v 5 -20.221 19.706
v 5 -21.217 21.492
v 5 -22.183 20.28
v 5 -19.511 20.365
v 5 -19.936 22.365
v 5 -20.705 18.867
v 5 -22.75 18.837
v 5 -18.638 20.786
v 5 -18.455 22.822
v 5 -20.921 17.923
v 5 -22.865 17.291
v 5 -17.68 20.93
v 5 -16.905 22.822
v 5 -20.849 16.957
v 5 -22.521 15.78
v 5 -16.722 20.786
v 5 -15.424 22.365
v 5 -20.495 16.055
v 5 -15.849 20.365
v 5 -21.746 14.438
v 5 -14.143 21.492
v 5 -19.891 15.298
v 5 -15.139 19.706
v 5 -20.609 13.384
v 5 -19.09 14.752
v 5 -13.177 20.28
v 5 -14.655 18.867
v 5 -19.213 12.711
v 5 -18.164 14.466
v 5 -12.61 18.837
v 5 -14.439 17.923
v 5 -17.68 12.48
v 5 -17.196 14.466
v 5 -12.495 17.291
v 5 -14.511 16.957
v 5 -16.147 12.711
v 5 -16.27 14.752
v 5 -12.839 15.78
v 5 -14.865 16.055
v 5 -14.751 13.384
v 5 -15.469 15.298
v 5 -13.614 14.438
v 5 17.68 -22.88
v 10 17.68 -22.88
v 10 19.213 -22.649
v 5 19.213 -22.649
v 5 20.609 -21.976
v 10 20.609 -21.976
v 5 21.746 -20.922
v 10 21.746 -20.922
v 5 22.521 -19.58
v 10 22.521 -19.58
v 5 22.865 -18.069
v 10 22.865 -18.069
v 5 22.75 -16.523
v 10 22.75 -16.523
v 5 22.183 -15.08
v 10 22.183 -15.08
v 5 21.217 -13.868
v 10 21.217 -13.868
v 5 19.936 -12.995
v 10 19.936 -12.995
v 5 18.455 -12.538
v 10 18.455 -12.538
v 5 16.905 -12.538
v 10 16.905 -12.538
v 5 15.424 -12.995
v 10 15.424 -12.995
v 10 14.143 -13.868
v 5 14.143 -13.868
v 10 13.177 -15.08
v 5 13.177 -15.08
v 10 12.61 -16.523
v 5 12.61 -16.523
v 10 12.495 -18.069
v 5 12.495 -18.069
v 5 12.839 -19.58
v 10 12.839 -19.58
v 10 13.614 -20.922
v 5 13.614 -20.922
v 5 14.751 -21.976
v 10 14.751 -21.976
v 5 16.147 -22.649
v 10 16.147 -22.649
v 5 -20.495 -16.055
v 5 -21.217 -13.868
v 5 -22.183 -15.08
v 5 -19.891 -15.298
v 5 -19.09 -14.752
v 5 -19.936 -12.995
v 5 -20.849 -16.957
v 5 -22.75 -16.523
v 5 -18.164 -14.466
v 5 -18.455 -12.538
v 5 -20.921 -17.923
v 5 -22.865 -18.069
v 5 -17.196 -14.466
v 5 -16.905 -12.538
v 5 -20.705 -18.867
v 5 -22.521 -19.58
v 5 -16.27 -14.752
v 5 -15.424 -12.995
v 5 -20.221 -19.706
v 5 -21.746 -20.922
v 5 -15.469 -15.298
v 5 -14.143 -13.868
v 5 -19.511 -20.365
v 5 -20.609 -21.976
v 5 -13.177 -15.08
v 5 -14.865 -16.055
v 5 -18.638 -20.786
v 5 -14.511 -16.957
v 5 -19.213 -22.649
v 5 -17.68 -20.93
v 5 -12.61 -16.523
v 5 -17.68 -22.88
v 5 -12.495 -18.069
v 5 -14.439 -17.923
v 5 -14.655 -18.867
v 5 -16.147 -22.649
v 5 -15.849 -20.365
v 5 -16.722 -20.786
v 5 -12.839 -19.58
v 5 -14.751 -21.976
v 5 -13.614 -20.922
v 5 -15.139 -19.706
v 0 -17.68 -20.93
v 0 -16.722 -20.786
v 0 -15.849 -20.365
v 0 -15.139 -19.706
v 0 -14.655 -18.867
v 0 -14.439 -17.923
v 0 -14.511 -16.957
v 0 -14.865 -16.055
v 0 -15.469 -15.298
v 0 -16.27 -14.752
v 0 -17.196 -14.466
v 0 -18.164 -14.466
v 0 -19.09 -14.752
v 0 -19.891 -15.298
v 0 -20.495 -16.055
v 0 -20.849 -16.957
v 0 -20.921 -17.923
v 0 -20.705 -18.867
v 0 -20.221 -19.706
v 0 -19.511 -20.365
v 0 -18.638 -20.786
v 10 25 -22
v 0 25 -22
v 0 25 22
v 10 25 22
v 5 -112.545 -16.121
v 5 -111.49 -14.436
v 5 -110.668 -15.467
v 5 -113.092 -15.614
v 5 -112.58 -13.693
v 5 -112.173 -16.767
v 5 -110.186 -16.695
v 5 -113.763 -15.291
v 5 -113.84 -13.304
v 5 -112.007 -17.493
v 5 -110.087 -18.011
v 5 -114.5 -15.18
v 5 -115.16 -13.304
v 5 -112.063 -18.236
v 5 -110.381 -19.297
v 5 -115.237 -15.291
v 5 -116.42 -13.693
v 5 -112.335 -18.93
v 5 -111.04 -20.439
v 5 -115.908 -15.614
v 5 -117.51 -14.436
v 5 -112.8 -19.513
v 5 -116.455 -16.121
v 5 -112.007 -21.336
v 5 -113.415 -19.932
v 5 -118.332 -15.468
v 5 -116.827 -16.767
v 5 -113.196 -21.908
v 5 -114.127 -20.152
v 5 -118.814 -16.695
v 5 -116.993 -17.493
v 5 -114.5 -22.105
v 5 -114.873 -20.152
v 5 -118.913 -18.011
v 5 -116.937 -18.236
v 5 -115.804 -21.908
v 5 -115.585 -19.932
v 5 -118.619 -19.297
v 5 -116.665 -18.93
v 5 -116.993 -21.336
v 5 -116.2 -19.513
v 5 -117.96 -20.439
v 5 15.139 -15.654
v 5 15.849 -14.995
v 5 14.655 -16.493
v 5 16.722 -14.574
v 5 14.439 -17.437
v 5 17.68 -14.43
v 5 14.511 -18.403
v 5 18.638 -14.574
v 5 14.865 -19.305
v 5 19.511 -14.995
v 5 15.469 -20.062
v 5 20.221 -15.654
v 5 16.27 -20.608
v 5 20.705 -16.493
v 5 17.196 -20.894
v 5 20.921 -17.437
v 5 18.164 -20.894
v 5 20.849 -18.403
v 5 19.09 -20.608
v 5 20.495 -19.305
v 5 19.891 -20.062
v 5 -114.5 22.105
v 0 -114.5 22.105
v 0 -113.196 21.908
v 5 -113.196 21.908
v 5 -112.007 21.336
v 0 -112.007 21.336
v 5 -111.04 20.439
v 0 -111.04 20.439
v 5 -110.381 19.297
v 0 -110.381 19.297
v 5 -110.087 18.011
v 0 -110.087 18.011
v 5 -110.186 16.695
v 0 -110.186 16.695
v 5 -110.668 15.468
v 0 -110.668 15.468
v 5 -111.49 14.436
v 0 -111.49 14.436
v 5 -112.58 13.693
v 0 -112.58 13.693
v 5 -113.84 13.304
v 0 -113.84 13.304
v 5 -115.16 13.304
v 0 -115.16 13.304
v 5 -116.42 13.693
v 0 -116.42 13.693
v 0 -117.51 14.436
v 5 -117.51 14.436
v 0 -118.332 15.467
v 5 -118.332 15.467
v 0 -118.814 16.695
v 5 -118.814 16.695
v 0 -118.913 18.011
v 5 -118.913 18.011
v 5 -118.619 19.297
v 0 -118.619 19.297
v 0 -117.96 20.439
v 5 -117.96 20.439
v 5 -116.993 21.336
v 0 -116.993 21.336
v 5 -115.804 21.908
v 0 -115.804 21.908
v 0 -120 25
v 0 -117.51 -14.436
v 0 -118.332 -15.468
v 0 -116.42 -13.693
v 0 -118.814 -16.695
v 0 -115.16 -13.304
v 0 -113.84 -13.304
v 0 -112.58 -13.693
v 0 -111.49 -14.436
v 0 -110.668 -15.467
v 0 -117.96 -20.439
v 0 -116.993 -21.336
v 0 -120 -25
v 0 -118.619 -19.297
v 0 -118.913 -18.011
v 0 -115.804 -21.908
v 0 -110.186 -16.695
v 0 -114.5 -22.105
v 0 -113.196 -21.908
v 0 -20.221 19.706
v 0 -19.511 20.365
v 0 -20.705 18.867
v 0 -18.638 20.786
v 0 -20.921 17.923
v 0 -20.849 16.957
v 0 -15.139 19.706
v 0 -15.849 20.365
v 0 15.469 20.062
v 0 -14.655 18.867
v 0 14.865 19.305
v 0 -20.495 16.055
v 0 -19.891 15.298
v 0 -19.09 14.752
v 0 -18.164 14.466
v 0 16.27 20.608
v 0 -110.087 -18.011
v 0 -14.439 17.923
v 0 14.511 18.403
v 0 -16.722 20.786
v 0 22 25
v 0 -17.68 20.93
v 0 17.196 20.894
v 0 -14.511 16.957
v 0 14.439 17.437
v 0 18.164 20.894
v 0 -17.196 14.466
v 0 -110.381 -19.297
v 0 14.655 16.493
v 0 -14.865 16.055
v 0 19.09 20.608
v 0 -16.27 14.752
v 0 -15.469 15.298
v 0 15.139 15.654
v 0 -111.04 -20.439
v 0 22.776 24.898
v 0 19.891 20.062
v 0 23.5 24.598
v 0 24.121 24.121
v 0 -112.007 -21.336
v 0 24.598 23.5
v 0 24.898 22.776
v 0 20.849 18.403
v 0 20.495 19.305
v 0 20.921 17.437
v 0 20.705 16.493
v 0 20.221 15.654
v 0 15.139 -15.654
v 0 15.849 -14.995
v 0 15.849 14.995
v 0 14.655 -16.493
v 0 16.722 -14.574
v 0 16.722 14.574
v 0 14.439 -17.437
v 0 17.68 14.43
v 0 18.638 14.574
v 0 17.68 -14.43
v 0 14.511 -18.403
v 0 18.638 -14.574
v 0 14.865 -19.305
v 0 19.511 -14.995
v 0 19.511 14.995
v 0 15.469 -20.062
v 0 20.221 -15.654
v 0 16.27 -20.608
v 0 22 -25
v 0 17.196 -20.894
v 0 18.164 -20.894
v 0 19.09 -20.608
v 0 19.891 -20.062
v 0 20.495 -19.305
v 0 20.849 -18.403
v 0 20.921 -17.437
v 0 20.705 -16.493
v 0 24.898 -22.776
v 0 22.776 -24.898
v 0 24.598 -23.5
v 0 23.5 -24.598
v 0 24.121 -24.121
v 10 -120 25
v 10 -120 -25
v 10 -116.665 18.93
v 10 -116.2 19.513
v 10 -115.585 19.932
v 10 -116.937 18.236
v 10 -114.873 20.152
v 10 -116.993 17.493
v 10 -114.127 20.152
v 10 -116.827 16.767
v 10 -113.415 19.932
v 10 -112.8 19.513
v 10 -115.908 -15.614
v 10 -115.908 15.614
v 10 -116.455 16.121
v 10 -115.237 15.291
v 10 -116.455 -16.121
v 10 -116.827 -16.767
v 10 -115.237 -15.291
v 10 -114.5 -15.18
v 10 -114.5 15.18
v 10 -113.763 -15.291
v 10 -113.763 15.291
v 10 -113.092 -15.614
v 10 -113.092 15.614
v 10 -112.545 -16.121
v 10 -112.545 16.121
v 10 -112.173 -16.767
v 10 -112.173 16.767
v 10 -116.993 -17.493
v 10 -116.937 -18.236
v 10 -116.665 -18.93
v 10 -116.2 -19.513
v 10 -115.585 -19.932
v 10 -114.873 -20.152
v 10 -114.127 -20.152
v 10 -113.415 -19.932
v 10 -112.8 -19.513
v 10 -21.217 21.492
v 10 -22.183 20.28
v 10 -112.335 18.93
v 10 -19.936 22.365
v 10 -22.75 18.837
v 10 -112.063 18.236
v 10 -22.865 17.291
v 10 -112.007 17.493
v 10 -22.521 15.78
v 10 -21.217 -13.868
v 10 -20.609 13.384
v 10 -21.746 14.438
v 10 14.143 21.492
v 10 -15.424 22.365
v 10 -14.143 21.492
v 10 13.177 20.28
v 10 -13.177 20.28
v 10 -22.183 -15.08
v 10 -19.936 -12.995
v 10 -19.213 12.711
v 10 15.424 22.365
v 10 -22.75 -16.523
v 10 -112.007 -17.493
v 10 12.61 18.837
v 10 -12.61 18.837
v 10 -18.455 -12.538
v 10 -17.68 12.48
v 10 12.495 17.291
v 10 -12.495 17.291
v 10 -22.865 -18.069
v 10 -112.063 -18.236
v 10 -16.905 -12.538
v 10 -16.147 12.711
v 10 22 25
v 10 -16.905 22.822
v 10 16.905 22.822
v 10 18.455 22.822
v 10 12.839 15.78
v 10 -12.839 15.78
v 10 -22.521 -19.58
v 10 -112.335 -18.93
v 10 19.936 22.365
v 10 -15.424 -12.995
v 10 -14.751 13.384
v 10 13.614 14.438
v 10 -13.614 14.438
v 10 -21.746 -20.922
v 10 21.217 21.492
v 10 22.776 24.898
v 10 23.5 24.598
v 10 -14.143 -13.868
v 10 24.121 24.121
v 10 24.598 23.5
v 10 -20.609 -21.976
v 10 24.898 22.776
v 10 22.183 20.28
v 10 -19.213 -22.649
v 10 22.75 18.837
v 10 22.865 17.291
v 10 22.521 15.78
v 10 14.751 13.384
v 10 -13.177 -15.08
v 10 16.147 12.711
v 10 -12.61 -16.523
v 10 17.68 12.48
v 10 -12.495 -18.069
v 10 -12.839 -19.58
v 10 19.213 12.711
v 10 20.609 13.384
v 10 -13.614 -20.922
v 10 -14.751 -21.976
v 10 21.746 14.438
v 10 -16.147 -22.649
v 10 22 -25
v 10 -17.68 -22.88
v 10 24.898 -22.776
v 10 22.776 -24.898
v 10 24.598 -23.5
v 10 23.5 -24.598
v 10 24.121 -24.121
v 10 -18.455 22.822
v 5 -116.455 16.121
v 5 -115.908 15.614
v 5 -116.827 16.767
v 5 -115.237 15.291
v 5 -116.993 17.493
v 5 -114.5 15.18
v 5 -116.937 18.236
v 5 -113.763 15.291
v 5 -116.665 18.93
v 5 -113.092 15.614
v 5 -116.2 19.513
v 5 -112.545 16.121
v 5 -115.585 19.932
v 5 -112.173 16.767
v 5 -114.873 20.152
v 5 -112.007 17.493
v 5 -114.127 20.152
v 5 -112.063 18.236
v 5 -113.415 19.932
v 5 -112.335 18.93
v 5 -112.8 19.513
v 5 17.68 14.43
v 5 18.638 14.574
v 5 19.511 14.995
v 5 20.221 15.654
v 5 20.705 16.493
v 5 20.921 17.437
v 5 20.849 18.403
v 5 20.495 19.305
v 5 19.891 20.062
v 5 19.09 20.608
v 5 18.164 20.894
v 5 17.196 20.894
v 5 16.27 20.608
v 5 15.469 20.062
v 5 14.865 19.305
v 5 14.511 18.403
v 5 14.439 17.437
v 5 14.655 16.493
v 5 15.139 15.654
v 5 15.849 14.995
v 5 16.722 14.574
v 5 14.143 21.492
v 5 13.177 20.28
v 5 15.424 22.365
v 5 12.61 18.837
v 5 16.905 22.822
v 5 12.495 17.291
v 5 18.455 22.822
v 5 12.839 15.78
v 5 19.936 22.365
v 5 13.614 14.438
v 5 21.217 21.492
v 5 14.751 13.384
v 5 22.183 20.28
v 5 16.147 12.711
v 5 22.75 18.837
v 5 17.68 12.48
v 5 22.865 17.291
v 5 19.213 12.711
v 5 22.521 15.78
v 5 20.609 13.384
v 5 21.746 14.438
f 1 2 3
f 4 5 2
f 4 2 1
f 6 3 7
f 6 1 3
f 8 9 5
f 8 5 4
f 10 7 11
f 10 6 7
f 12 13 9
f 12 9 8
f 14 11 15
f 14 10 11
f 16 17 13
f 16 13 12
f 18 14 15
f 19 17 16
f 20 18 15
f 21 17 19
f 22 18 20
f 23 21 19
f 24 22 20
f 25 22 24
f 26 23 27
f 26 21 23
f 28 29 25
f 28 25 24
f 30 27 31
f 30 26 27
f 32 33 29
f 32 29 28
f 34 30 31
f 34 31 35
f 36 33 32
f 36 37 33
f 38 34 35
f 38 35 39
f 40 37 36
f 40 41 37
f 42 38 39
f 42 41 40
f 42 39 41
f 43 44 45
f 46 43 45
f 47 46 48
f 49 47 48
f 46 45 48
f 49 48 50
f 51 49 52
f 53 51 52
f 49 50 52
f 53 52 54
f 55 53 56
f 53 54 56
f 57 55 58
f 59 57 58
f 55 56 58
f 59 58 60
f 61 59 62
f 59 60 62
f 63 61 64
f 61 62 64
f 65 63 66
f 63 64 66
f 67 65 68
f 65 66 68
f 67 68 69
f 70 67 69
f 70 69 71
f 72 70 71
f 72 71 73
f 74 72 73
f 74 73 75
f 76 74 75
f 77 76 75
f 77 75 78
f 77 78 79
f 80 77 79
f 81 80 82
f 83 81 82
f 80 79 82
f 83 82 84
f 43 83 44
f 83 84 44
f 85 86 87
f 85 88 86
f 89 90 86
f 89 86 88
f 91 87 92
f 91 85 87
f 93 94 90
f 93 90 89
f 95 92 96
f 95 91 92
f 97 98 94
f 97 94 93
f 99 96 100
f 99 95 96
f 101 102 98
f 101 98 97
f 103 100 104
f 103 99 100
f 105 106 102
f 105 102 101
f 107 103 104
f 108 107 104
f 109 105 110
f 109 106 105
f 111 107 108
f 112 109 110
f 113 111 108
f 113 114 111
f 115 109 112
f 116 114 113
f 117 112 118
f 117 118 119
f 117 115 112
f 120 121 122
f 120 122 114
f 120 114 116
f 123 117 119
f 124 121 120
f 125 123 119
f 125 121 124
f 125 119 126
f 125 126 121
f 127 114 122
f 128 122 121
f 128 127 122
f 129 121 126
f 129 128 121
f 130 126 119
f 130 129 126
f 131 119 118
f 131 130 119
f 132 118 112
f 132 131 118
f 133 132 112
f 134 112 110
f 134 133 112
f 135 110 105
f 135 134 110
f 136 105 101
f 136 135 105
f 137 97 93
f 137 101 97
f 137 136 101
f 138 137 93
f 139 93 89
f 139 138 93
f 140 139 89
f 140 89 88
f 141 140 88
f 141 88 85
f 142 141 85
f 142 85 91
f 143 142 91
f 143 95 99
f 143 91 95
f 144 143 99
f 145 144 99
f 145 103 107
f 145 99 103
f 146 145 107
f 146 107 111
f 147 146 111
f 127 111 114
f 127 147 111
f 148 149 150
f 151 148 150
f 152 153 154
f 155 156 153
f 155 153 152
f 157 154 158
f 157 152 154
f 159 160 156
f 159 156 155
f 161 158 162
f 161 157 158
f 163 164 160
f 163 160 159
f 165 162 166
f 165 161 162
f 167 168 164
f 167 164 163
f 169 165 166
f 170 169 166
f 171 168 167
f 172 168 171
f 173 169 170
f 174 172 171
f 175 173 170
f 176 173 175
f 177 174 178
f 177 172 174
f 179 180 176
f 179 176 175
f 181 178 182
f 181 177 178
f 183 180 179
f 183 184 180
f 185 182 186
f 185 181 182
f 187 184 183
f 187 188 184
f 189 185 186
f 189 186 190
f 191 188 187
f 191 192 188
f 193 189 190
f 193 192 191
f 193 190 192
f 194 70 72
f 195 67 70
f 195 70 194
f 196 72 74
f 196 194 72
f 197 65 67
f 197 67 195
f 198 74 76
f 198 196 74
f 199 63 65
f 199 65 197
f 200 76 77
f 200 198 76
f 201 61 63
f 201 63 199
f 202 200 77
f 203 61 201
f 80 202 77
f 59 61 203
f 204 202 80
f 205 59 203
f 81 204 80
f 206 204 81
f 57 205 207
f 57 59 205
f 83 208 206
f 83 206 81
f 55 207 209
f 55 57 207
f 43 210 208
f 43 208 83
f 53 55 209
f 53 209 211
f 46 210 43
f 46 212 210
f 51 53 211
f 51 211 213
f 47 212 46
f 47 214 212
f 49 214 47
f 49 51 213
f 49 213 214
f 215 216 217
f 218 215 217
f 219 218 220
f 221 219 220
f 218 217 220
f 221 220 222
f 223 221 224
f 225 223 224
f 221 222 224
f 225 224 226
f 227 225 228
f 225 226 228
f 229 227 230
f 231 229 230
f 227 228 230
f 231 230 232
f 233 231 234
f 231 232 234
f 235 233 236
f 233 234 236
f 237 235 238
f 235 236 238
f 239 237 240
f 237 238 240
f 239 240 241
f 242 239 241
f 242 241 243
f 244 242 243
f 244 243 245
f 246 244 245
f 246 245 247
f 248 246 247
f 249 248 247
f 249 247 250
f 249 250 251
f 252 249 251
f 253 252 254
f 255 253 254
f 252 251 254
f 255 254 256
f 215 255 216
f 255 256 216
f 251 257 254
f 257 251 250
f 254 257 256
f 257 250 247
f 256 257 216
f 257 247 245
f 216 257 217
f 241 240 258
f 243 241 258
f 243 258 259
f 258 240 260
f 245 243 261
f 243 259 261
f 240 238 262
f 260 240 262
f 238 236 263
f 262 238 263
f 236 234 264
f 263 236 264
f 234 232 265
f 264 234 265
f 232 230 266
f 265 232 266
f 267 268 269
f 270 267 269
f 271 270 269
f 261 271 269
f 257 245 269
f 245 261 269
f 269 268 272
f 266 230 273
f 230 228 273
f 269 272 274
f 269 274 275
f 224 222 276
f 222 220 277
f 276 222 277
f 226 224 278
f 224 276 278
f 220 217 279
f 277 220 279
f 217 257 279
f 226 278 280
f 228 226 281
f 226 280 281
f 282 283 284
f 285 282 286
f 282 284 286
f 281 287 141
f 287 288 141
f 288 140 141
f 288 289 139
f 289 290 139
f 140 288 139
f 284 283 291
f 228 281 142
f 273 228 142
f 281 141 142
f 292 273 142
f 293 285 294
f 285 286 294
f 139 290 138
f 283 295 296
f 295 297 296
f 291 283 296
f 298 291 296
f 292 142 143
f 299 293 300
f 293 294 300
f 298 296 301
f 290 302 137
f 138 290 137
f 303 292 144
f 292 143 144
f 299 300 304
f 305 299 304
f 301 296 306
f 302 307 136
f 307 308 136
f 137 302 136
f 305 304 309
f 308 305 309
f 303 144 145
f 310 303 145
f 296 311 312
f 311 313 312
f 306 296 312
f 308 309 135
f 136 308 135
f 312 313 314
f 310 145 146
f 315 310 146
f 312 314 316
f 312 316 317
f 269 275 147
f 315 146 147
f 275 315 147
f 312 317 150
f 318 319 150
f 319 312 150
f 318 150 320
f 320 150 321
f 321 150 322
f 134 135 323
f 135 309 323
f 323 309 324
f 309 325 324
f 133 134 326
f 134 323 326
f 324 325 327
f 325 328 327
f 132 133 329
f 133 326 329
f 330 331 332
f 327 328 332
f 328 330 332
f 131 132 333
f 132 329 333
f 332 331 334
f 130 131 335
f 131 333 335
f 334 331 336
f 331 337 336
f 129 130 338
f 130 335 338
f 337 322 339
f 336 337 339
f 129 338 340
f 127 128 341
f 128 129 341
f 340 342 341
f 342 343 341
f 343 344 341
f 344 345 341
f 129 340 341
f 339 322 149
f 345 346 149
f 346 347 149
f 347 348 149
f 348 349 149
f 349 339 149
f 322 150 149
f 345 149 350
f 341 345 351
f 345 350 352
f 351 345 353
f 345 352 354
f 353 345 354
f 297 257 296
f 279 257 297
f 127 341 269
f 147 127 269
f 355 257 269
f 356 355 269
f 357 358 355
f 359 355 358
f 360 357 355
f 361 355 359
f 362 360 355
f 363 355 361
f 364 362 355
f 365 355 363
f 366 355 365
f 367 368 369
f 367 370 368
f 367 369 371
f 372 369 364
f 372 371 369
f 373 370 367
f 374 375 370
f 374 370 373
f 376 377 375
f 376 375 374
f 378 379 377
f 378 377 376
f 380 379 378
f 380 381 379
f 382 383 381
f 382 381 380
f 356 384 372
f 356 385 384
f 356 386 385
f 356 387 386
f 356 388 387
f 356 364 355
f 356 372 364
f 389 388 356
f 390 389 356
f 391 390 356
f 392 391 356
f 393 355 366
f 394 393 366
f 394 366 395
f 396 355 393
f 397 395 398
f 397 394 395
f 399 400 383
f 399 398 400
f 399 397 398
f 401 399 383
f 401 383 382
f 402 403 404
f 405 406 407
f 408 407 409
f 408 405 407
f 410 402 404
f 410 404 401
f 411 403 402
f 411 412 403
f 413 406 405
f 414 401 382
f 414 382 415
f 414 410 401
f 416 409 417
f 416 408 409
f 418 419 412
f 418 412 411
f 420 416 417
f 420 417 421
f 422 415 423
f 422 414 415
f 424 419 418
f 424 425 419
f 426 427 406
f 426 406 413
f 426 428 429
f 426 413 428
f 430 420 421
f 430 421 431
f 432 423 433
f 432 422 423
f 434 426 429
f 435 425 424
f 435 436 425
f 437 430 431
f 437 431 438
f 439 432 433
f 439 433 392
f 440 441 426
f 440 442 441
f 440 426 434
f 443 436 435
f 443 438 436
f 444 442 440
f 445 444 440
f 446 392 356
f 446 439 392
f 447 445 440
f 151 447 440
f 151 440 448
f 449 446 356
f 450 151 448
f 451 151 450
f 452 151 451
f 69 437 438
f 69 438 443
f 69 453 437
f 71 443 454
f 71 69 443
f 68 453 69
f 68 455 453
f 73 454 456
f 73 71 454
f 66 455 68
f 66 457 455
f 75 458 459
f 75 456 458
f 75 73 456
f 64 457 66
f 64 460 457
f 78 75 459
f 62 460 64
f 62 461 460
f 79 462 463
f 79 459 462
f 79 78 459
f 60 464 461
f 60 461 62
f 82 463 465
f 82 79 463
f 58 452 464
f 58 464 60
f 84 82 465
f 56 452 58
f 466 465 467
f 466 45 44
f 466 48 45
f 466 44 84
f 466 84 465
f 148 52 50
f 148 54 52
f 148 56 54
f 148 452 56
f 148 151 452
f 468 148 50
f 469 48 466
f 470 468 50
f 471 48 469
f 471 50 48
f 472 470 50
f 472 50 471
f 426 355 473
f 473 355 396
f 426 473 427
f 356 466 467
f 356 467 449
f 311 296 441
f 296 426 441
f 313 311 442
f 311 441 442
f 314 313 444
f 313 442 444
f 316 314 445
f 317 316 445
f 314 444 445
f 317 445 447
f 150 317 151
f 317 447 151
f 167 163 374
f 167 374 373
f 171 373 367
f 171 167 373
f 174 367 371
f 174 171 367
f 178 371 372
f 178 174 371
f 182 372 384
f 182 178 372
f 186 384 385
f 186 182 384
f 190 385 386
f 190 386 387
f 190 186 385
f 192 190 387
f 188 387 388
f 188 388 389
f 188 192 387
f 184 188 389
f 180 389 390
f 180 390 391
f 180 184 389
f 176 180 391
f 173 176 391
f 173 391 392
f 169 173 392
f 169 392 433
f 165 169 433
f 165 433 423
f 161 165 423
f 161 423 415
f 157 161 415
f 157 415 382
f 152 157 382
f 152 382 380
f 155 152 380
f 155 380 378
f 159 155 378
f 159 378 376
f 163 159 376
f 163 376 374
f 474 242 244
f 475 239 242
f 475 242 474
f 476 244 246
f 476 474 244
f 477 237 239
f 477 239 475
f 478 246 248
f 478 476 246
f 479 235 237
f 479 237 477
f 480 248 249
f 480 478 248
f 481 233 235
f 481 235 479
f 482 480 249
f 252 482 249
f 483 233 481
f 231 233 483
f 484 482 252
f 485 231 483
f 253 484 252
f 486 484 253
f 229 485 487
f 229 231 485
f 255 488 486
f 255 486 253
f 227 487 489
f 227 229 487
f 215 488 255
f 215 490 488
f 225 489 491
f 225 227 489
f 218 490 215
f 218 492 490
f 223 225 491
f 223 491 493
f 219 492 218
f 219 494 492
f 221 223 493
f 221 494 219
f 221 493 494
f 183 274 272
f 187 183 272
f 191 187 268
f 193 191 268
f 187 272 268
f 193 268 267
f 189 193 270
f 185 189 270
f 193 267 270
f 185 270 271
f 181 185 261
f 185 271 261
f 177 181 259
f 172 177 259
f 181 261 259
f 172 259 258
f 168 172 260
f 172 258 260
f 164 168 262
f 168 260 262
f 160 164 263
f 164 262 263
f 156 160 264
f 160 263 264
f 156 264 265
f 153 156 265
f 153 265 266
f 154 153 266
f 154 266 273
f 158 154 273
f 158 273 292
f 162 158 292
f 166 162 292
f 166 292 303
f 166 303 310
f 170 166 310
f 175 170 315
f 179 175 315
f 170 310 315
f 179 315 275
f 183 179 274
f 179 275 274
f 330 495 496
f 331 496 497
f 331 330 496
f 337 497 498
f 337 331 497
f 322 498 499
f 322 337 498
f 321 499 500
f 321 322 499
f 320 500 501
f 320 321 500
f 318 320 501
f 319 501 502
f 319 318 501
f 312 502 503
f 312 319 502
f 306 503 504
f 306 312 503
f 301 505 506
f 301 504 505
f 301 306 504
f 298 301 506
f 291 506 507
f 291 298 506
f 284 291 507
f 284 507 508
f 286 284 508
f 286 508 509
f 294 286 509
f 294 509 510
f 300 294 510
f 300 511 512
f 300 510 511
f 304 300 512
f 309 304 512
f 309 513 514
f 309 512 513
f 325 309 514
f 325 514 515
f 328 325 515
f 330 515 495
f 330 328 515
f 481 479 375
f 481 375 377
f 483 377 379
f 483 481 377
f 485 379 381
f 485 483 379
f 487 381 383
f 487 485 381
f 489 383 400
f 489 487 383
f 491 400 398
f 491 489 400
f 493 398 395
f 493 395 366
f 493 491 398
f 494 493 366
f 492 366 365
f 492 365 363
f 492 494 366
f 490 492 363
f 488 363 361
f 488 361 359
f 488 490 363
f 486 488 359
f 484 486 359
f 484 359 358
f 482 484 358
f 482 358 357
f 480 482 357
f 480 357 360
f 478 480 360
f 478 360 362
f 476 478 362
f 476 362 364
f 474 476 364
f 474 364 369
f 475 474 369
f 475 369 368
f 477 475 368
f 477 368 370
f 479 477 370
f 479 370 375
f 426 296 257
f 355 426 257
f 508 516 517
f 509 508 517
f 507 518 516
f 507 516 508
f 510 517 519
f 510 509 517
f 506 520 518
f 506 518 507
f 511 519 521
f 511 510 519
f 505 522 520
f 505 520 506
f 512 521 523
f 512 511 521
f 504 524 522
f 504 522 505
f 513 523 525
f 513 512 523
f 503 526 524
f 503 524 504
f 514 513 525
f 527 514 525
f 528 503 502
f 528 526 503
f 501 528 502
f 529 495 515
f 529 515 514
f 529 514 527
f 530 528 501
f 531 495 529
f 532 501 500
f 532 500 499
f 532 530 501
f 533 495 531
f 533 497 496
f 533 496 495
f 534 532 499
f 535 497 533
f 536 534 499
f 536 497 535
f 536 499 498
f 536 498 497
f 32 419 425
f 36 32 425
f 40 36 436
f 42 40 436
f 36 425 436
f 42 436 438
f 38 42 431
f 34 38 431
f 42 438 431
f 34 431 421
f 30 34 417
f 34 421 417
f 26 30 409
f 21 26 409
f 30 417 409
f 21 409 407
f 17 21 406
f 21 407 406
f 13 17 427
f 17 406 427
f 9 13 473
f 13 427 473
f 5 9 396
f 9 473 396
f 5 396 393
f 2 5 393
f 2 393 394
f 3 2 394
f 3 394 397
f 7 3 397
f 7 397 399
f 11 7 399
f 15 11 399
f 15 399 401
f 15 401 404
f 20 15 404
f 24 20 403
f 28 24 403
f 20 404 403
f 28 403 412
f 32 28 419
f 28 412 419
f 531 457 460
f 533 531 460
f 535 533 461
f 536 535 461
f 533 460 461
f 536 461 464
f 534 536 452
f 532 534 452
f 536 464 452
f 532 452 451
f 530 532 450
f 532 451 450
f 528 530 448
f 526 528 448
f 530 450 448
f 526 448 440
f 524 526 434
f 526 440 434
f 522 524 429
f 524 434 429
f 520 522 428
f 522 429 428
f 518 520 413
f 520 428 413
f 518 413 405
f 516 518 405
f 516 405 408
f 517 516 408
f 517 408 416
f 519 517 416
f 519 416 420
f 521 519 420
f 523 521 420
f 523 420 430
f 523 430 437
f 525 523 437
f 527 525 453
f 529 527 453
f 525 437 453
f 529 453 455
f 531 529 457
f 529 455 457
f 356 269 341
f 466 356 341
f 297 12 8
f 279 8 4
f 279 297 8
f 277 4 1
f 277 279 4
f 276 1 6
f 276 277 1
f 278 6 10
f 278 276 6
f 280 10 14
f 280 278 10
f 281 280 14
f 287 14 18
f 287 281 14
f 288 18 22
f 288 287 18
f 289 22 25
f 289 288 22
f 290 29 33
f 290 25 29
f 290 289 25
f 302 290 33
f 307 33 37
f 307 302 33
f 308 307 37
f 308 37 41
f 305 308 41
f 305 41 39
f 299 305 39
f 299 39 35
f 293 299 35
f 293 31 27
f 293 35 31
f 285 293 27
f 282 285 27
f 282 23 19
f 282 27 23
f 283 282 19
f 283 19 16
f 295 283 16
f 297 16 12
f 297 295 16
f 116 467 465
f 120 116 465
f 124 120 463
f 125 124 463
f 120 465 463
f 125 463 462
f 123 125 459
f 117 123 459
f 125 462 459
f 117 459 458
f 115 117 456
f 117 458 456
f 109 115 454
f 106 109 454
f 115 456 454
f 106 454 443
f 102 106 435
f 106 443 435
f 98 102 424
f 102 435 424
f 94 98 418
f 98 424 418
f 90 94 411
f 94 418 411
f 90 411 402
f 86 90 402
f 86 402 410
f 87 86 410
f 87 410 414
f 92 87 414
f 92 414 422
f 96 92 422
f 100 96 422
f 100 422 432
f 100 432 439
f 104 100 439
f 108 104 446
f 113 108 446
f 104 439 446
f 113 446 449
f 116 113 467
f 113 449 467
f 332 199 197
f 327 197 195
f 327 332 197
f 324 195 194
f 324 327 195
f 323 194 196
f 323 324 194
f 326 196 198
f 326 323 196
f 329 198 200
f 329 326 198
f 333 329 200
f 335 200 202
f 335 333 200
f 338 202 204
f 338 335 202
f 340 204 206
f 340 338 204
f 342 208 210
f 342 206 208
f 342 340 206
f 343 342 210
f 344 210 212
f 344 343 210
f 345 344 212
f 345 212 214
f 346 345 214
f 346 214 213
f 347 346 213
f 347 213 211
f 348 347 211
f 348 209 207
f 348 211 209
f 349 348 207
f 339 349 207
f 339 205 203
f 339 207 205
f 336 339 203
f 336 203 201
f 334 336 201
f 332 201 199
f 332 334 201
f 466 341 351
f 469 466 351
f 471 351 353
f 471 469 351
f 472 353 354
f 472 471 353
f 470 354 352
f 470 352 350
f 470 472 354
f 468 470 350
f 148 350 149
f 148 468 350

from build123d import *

# Parameters (mm, degrees)
CROQUIS1_R              = 3.25
CROQUIS1_R_2            = 2.5
SALIENTE_EXTRUIR1_DEPTH = 10
CROQUIS5_R              = 5.2
CORTAR_EXTRUIR2_DEPTH   = 5
FILLET1_R               = 3
SKETCH1_R               = 4.425
CUT_EXTRUDE1_DEPTH      = 5


with BuildPart() as part:
    # Croquis1 → Saliente-Extruir1 (new body)
    with BuildSketch(Plane(origin=(0, 0, 0), x_dir=(0, 0, -1), z_dir=(1, 0, 0))):
        Polygon((-25, -120), (25, -120), (25, 25), (0, 25), (-25, 25), (-25, 0), align=None)
        with Locations((-17.68, 17.68)):
            Circle(CROQUIS1_R, mode=Mode.SUBTRACT)
        with Locations(Location((17.68, 17.68, 0), (0, 0, 180))):
            Circle(CROQUIS1_R, mode=Mode.SUBTRACT)
        with Locations((17.68, -17.68)):
            Circle(CROQUIS1_R, mode=Mode.SUBTRACT)
        with Locations(Location((-17.68, -17.68, 0), (0, 0, 180))):
            Circle(CROQUIS1_R, mode=Mode.SUBTRACT)
        with Locations((-17.68, -114.5)):
            Circle(CROQUIS1_R_2, mode=Mode.SUBTRACT)
        with Locations(Location((17.68, -114.5, 0), (0, 0, 180))):
            Circle(CROQUIS1_R_2, mode=Mode.SUBTRACT)
    extrude(amount=SALIENTE_EXTRUIR1_DEPTH)

    # Croquis5 → Cortar-Extruir2 (cut)
    with BuildSketch(Plane(origin=(10, 0, 0), x_dir=(0, 0, -1), z_dir=(1, 0, 0))):
        with Locations((17.68, 17.68)):
            Circle(CROQUIS5_R)
        with Locations((-17.68, 17.68)):
            Circle(CROQUIS5_R)
        with Locations((-17.68, -17.68)):
            Circle(CROQUIS5_R)
        with Locations((17.68, -17.68)):
            Circle(CROQUIS5_R)
    extrude(amount=-CORTAR_EXTRUIR2_DEPTH, mode=Mode.SUBTRACT)

    # Fillet1
    fillet1_edges = [part.edges().sort_by_distance(p)[0] for p in [
        (5, 25, -25),
        (5, 25, 25),
    ]]
    fillet(fillet1_edges, radius=FILLET1_R)

    # Sketch1 → Cut-Extrude1 (cut)
    with BuildSketch(Plane.ZY):
        with Locations((17.68, -114.5)):
            Circle(SKETCH1_R)
        with Locations(Location((-17.68, -114.5, 0), (0, 0, 180))):
            Circle(SKETCH1_R)
    extrude(amount=-CUT_EXTRUDE1_DEPTH, mode=Mode.SUBTRACT)


solid = part.part
